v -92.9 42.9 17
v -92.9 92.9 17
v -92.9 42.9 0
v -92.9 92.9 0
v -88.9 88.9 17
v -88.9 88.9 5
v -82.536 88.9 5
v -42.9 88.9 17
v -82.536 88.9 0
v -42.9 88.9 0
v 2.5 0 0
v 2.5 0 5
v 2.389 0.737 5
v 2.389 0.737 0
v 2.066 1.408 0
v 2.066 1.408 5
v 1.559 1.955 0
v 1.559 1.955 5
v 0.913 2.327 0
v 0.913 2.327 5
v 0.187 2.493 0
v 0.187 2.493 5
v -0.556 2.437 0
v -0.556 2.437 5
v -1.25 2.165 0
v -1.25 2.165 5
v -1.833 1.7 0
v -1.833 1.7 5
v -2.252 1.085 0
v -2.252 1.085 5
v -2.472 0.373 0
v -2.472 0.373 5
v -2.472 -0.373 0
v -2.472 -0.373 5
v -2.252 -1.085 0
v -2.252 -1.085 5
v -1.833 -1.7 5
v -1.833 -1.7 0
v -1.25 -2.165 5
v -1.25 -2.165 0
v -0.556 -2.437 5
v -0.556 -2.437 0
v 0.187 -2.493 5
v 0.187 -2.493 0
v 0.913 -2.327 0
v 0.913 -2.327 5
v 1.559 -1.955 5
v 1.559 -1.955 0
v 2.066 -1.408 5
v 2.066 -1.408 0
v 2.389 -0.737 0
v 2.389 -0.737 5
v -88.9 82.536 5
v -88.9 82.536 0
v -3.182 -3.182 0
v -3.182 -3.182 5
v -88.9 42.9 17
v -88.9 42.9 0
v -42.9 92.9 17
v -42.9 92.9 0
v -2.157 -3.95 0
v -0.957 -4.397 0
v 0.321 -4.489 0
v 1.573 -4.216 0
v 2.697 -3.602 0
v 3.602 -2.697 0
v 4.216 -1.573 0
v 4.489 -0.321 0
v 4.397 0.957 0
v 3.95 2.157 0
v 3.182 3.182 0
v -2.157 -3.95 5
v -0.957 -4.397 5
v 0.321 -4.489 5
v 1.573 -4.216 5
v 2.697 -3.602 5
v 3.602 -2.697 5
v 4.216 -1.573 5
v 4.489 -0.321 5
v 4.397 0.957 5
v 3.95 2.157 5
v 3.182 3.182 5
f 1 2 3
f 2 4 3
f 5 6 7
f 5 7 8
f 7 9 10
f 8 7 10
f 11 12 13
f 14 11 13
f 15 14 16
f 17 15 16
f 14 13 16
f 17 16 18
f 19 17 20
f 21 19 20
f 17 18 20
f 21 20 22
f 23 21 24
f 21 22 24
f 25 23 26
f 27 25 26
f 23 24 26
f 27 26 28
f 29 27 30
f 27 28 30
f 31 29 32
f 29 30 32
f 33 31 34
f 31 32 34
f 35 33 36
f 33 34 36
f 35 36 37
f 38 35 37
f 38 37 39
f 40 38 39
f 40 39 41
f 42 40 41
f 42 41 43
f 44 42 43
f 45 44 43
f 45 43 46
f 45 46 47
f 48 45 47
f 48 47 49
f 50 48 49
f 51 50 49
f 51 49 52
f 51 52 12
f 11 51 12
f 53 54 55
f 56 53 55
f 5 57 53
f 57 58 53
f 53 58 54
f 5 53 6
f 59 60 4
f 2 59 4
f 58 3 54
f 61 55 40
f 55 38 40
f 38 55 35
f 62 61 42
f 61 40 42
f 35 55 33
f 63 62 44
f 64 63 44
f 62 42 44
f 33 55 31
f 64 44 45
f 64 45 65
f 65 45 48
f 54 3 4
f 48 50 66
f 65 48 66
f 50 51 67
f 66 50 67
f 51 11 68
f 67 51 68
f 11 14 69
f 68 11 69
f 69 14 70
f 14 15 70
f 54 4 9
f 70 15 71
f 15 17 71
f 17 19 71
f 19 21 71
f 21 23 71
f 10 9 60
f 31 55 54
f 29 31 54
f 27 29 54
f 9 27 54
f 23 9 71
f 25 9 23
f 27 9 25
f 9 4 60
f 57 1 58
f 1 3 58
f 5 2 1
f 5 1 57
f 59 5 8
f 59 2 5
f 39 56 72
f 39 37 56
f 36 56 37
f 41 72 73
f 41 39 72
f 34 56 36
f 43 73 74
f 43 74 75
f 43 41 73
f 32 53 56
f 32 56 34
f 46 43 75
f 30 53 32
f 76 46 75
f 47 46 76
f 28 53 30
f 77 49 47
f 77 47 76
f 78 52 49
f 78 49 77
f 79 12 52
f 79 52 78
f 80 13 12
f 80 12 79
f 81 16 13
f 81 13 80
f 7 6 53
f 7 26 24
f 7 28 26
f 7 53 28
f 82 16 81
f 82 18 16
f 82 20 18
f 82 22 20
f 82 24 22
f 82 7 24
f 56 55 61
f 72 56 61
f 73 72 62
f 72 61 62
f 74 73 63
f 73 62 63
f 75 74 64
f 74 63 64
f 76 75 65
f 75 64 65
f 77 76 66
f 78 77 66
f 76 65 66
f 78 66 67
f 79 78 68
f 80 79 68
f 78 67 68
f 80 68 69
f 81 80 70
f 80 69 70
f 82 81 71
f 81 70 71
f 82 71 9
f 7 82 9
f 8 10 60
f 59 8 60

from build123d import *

# Parameters (mm, degrees)
F1_DEPTH = 5
F3_DEPTH = 12
F4_R     = 2.5
F5_DEPTH = 25


with BuildPart() as f1:
    # F0 (on Top) → F1 (new body)
    with BuildSketch(Plane.XY):
        with BuildLine():
            Line((-92.9, 92.9), (-92.9, 42.9))
            Line((-92.9, 42.9), (-88.9, 42.9))
            Line((-88.9, 42.9), (-88.9, 82.536039))
            Line((-88.9, 82.536039), (-3.181981, -3.181981))
            ThreePointArc((-3.181981, -3.181981), (3.181981, -3.181981), (3.181981, 3.181981))
            Line((3.181981, 3.181981), (-82.536039, 88.9))
            Line((-82.536039, 88.9), (-42.9, 88.9))
            Line((-42.9, 88.9), (-42.9, 92.9))
            Line((-42.9, 92.9), (-92.9, 92.9))
        make_face()
    extrude(amount=F1_DEPTH)

    # F2 (on face) → F3 (join)
    with BuildSketch(Plane.XY.offset(5)):
        Polygon((-42.9, 92.9), (-92.9, 92.9), (-92.9, 42.9), (-88.9, 42.9), (-88.9, 88.9), (-42.9, 88.9), align=None)
    extrude(amount=F3_DEPTH)

    # F4 (on face) → F5 (cut)
    with BuildSketch(Plane.XY.offset(5)):
        Circle(F4_R)
    extrude(amount=-F5_DEPTH, mode=Mode.SUBTRACT)


solid = f1.part
